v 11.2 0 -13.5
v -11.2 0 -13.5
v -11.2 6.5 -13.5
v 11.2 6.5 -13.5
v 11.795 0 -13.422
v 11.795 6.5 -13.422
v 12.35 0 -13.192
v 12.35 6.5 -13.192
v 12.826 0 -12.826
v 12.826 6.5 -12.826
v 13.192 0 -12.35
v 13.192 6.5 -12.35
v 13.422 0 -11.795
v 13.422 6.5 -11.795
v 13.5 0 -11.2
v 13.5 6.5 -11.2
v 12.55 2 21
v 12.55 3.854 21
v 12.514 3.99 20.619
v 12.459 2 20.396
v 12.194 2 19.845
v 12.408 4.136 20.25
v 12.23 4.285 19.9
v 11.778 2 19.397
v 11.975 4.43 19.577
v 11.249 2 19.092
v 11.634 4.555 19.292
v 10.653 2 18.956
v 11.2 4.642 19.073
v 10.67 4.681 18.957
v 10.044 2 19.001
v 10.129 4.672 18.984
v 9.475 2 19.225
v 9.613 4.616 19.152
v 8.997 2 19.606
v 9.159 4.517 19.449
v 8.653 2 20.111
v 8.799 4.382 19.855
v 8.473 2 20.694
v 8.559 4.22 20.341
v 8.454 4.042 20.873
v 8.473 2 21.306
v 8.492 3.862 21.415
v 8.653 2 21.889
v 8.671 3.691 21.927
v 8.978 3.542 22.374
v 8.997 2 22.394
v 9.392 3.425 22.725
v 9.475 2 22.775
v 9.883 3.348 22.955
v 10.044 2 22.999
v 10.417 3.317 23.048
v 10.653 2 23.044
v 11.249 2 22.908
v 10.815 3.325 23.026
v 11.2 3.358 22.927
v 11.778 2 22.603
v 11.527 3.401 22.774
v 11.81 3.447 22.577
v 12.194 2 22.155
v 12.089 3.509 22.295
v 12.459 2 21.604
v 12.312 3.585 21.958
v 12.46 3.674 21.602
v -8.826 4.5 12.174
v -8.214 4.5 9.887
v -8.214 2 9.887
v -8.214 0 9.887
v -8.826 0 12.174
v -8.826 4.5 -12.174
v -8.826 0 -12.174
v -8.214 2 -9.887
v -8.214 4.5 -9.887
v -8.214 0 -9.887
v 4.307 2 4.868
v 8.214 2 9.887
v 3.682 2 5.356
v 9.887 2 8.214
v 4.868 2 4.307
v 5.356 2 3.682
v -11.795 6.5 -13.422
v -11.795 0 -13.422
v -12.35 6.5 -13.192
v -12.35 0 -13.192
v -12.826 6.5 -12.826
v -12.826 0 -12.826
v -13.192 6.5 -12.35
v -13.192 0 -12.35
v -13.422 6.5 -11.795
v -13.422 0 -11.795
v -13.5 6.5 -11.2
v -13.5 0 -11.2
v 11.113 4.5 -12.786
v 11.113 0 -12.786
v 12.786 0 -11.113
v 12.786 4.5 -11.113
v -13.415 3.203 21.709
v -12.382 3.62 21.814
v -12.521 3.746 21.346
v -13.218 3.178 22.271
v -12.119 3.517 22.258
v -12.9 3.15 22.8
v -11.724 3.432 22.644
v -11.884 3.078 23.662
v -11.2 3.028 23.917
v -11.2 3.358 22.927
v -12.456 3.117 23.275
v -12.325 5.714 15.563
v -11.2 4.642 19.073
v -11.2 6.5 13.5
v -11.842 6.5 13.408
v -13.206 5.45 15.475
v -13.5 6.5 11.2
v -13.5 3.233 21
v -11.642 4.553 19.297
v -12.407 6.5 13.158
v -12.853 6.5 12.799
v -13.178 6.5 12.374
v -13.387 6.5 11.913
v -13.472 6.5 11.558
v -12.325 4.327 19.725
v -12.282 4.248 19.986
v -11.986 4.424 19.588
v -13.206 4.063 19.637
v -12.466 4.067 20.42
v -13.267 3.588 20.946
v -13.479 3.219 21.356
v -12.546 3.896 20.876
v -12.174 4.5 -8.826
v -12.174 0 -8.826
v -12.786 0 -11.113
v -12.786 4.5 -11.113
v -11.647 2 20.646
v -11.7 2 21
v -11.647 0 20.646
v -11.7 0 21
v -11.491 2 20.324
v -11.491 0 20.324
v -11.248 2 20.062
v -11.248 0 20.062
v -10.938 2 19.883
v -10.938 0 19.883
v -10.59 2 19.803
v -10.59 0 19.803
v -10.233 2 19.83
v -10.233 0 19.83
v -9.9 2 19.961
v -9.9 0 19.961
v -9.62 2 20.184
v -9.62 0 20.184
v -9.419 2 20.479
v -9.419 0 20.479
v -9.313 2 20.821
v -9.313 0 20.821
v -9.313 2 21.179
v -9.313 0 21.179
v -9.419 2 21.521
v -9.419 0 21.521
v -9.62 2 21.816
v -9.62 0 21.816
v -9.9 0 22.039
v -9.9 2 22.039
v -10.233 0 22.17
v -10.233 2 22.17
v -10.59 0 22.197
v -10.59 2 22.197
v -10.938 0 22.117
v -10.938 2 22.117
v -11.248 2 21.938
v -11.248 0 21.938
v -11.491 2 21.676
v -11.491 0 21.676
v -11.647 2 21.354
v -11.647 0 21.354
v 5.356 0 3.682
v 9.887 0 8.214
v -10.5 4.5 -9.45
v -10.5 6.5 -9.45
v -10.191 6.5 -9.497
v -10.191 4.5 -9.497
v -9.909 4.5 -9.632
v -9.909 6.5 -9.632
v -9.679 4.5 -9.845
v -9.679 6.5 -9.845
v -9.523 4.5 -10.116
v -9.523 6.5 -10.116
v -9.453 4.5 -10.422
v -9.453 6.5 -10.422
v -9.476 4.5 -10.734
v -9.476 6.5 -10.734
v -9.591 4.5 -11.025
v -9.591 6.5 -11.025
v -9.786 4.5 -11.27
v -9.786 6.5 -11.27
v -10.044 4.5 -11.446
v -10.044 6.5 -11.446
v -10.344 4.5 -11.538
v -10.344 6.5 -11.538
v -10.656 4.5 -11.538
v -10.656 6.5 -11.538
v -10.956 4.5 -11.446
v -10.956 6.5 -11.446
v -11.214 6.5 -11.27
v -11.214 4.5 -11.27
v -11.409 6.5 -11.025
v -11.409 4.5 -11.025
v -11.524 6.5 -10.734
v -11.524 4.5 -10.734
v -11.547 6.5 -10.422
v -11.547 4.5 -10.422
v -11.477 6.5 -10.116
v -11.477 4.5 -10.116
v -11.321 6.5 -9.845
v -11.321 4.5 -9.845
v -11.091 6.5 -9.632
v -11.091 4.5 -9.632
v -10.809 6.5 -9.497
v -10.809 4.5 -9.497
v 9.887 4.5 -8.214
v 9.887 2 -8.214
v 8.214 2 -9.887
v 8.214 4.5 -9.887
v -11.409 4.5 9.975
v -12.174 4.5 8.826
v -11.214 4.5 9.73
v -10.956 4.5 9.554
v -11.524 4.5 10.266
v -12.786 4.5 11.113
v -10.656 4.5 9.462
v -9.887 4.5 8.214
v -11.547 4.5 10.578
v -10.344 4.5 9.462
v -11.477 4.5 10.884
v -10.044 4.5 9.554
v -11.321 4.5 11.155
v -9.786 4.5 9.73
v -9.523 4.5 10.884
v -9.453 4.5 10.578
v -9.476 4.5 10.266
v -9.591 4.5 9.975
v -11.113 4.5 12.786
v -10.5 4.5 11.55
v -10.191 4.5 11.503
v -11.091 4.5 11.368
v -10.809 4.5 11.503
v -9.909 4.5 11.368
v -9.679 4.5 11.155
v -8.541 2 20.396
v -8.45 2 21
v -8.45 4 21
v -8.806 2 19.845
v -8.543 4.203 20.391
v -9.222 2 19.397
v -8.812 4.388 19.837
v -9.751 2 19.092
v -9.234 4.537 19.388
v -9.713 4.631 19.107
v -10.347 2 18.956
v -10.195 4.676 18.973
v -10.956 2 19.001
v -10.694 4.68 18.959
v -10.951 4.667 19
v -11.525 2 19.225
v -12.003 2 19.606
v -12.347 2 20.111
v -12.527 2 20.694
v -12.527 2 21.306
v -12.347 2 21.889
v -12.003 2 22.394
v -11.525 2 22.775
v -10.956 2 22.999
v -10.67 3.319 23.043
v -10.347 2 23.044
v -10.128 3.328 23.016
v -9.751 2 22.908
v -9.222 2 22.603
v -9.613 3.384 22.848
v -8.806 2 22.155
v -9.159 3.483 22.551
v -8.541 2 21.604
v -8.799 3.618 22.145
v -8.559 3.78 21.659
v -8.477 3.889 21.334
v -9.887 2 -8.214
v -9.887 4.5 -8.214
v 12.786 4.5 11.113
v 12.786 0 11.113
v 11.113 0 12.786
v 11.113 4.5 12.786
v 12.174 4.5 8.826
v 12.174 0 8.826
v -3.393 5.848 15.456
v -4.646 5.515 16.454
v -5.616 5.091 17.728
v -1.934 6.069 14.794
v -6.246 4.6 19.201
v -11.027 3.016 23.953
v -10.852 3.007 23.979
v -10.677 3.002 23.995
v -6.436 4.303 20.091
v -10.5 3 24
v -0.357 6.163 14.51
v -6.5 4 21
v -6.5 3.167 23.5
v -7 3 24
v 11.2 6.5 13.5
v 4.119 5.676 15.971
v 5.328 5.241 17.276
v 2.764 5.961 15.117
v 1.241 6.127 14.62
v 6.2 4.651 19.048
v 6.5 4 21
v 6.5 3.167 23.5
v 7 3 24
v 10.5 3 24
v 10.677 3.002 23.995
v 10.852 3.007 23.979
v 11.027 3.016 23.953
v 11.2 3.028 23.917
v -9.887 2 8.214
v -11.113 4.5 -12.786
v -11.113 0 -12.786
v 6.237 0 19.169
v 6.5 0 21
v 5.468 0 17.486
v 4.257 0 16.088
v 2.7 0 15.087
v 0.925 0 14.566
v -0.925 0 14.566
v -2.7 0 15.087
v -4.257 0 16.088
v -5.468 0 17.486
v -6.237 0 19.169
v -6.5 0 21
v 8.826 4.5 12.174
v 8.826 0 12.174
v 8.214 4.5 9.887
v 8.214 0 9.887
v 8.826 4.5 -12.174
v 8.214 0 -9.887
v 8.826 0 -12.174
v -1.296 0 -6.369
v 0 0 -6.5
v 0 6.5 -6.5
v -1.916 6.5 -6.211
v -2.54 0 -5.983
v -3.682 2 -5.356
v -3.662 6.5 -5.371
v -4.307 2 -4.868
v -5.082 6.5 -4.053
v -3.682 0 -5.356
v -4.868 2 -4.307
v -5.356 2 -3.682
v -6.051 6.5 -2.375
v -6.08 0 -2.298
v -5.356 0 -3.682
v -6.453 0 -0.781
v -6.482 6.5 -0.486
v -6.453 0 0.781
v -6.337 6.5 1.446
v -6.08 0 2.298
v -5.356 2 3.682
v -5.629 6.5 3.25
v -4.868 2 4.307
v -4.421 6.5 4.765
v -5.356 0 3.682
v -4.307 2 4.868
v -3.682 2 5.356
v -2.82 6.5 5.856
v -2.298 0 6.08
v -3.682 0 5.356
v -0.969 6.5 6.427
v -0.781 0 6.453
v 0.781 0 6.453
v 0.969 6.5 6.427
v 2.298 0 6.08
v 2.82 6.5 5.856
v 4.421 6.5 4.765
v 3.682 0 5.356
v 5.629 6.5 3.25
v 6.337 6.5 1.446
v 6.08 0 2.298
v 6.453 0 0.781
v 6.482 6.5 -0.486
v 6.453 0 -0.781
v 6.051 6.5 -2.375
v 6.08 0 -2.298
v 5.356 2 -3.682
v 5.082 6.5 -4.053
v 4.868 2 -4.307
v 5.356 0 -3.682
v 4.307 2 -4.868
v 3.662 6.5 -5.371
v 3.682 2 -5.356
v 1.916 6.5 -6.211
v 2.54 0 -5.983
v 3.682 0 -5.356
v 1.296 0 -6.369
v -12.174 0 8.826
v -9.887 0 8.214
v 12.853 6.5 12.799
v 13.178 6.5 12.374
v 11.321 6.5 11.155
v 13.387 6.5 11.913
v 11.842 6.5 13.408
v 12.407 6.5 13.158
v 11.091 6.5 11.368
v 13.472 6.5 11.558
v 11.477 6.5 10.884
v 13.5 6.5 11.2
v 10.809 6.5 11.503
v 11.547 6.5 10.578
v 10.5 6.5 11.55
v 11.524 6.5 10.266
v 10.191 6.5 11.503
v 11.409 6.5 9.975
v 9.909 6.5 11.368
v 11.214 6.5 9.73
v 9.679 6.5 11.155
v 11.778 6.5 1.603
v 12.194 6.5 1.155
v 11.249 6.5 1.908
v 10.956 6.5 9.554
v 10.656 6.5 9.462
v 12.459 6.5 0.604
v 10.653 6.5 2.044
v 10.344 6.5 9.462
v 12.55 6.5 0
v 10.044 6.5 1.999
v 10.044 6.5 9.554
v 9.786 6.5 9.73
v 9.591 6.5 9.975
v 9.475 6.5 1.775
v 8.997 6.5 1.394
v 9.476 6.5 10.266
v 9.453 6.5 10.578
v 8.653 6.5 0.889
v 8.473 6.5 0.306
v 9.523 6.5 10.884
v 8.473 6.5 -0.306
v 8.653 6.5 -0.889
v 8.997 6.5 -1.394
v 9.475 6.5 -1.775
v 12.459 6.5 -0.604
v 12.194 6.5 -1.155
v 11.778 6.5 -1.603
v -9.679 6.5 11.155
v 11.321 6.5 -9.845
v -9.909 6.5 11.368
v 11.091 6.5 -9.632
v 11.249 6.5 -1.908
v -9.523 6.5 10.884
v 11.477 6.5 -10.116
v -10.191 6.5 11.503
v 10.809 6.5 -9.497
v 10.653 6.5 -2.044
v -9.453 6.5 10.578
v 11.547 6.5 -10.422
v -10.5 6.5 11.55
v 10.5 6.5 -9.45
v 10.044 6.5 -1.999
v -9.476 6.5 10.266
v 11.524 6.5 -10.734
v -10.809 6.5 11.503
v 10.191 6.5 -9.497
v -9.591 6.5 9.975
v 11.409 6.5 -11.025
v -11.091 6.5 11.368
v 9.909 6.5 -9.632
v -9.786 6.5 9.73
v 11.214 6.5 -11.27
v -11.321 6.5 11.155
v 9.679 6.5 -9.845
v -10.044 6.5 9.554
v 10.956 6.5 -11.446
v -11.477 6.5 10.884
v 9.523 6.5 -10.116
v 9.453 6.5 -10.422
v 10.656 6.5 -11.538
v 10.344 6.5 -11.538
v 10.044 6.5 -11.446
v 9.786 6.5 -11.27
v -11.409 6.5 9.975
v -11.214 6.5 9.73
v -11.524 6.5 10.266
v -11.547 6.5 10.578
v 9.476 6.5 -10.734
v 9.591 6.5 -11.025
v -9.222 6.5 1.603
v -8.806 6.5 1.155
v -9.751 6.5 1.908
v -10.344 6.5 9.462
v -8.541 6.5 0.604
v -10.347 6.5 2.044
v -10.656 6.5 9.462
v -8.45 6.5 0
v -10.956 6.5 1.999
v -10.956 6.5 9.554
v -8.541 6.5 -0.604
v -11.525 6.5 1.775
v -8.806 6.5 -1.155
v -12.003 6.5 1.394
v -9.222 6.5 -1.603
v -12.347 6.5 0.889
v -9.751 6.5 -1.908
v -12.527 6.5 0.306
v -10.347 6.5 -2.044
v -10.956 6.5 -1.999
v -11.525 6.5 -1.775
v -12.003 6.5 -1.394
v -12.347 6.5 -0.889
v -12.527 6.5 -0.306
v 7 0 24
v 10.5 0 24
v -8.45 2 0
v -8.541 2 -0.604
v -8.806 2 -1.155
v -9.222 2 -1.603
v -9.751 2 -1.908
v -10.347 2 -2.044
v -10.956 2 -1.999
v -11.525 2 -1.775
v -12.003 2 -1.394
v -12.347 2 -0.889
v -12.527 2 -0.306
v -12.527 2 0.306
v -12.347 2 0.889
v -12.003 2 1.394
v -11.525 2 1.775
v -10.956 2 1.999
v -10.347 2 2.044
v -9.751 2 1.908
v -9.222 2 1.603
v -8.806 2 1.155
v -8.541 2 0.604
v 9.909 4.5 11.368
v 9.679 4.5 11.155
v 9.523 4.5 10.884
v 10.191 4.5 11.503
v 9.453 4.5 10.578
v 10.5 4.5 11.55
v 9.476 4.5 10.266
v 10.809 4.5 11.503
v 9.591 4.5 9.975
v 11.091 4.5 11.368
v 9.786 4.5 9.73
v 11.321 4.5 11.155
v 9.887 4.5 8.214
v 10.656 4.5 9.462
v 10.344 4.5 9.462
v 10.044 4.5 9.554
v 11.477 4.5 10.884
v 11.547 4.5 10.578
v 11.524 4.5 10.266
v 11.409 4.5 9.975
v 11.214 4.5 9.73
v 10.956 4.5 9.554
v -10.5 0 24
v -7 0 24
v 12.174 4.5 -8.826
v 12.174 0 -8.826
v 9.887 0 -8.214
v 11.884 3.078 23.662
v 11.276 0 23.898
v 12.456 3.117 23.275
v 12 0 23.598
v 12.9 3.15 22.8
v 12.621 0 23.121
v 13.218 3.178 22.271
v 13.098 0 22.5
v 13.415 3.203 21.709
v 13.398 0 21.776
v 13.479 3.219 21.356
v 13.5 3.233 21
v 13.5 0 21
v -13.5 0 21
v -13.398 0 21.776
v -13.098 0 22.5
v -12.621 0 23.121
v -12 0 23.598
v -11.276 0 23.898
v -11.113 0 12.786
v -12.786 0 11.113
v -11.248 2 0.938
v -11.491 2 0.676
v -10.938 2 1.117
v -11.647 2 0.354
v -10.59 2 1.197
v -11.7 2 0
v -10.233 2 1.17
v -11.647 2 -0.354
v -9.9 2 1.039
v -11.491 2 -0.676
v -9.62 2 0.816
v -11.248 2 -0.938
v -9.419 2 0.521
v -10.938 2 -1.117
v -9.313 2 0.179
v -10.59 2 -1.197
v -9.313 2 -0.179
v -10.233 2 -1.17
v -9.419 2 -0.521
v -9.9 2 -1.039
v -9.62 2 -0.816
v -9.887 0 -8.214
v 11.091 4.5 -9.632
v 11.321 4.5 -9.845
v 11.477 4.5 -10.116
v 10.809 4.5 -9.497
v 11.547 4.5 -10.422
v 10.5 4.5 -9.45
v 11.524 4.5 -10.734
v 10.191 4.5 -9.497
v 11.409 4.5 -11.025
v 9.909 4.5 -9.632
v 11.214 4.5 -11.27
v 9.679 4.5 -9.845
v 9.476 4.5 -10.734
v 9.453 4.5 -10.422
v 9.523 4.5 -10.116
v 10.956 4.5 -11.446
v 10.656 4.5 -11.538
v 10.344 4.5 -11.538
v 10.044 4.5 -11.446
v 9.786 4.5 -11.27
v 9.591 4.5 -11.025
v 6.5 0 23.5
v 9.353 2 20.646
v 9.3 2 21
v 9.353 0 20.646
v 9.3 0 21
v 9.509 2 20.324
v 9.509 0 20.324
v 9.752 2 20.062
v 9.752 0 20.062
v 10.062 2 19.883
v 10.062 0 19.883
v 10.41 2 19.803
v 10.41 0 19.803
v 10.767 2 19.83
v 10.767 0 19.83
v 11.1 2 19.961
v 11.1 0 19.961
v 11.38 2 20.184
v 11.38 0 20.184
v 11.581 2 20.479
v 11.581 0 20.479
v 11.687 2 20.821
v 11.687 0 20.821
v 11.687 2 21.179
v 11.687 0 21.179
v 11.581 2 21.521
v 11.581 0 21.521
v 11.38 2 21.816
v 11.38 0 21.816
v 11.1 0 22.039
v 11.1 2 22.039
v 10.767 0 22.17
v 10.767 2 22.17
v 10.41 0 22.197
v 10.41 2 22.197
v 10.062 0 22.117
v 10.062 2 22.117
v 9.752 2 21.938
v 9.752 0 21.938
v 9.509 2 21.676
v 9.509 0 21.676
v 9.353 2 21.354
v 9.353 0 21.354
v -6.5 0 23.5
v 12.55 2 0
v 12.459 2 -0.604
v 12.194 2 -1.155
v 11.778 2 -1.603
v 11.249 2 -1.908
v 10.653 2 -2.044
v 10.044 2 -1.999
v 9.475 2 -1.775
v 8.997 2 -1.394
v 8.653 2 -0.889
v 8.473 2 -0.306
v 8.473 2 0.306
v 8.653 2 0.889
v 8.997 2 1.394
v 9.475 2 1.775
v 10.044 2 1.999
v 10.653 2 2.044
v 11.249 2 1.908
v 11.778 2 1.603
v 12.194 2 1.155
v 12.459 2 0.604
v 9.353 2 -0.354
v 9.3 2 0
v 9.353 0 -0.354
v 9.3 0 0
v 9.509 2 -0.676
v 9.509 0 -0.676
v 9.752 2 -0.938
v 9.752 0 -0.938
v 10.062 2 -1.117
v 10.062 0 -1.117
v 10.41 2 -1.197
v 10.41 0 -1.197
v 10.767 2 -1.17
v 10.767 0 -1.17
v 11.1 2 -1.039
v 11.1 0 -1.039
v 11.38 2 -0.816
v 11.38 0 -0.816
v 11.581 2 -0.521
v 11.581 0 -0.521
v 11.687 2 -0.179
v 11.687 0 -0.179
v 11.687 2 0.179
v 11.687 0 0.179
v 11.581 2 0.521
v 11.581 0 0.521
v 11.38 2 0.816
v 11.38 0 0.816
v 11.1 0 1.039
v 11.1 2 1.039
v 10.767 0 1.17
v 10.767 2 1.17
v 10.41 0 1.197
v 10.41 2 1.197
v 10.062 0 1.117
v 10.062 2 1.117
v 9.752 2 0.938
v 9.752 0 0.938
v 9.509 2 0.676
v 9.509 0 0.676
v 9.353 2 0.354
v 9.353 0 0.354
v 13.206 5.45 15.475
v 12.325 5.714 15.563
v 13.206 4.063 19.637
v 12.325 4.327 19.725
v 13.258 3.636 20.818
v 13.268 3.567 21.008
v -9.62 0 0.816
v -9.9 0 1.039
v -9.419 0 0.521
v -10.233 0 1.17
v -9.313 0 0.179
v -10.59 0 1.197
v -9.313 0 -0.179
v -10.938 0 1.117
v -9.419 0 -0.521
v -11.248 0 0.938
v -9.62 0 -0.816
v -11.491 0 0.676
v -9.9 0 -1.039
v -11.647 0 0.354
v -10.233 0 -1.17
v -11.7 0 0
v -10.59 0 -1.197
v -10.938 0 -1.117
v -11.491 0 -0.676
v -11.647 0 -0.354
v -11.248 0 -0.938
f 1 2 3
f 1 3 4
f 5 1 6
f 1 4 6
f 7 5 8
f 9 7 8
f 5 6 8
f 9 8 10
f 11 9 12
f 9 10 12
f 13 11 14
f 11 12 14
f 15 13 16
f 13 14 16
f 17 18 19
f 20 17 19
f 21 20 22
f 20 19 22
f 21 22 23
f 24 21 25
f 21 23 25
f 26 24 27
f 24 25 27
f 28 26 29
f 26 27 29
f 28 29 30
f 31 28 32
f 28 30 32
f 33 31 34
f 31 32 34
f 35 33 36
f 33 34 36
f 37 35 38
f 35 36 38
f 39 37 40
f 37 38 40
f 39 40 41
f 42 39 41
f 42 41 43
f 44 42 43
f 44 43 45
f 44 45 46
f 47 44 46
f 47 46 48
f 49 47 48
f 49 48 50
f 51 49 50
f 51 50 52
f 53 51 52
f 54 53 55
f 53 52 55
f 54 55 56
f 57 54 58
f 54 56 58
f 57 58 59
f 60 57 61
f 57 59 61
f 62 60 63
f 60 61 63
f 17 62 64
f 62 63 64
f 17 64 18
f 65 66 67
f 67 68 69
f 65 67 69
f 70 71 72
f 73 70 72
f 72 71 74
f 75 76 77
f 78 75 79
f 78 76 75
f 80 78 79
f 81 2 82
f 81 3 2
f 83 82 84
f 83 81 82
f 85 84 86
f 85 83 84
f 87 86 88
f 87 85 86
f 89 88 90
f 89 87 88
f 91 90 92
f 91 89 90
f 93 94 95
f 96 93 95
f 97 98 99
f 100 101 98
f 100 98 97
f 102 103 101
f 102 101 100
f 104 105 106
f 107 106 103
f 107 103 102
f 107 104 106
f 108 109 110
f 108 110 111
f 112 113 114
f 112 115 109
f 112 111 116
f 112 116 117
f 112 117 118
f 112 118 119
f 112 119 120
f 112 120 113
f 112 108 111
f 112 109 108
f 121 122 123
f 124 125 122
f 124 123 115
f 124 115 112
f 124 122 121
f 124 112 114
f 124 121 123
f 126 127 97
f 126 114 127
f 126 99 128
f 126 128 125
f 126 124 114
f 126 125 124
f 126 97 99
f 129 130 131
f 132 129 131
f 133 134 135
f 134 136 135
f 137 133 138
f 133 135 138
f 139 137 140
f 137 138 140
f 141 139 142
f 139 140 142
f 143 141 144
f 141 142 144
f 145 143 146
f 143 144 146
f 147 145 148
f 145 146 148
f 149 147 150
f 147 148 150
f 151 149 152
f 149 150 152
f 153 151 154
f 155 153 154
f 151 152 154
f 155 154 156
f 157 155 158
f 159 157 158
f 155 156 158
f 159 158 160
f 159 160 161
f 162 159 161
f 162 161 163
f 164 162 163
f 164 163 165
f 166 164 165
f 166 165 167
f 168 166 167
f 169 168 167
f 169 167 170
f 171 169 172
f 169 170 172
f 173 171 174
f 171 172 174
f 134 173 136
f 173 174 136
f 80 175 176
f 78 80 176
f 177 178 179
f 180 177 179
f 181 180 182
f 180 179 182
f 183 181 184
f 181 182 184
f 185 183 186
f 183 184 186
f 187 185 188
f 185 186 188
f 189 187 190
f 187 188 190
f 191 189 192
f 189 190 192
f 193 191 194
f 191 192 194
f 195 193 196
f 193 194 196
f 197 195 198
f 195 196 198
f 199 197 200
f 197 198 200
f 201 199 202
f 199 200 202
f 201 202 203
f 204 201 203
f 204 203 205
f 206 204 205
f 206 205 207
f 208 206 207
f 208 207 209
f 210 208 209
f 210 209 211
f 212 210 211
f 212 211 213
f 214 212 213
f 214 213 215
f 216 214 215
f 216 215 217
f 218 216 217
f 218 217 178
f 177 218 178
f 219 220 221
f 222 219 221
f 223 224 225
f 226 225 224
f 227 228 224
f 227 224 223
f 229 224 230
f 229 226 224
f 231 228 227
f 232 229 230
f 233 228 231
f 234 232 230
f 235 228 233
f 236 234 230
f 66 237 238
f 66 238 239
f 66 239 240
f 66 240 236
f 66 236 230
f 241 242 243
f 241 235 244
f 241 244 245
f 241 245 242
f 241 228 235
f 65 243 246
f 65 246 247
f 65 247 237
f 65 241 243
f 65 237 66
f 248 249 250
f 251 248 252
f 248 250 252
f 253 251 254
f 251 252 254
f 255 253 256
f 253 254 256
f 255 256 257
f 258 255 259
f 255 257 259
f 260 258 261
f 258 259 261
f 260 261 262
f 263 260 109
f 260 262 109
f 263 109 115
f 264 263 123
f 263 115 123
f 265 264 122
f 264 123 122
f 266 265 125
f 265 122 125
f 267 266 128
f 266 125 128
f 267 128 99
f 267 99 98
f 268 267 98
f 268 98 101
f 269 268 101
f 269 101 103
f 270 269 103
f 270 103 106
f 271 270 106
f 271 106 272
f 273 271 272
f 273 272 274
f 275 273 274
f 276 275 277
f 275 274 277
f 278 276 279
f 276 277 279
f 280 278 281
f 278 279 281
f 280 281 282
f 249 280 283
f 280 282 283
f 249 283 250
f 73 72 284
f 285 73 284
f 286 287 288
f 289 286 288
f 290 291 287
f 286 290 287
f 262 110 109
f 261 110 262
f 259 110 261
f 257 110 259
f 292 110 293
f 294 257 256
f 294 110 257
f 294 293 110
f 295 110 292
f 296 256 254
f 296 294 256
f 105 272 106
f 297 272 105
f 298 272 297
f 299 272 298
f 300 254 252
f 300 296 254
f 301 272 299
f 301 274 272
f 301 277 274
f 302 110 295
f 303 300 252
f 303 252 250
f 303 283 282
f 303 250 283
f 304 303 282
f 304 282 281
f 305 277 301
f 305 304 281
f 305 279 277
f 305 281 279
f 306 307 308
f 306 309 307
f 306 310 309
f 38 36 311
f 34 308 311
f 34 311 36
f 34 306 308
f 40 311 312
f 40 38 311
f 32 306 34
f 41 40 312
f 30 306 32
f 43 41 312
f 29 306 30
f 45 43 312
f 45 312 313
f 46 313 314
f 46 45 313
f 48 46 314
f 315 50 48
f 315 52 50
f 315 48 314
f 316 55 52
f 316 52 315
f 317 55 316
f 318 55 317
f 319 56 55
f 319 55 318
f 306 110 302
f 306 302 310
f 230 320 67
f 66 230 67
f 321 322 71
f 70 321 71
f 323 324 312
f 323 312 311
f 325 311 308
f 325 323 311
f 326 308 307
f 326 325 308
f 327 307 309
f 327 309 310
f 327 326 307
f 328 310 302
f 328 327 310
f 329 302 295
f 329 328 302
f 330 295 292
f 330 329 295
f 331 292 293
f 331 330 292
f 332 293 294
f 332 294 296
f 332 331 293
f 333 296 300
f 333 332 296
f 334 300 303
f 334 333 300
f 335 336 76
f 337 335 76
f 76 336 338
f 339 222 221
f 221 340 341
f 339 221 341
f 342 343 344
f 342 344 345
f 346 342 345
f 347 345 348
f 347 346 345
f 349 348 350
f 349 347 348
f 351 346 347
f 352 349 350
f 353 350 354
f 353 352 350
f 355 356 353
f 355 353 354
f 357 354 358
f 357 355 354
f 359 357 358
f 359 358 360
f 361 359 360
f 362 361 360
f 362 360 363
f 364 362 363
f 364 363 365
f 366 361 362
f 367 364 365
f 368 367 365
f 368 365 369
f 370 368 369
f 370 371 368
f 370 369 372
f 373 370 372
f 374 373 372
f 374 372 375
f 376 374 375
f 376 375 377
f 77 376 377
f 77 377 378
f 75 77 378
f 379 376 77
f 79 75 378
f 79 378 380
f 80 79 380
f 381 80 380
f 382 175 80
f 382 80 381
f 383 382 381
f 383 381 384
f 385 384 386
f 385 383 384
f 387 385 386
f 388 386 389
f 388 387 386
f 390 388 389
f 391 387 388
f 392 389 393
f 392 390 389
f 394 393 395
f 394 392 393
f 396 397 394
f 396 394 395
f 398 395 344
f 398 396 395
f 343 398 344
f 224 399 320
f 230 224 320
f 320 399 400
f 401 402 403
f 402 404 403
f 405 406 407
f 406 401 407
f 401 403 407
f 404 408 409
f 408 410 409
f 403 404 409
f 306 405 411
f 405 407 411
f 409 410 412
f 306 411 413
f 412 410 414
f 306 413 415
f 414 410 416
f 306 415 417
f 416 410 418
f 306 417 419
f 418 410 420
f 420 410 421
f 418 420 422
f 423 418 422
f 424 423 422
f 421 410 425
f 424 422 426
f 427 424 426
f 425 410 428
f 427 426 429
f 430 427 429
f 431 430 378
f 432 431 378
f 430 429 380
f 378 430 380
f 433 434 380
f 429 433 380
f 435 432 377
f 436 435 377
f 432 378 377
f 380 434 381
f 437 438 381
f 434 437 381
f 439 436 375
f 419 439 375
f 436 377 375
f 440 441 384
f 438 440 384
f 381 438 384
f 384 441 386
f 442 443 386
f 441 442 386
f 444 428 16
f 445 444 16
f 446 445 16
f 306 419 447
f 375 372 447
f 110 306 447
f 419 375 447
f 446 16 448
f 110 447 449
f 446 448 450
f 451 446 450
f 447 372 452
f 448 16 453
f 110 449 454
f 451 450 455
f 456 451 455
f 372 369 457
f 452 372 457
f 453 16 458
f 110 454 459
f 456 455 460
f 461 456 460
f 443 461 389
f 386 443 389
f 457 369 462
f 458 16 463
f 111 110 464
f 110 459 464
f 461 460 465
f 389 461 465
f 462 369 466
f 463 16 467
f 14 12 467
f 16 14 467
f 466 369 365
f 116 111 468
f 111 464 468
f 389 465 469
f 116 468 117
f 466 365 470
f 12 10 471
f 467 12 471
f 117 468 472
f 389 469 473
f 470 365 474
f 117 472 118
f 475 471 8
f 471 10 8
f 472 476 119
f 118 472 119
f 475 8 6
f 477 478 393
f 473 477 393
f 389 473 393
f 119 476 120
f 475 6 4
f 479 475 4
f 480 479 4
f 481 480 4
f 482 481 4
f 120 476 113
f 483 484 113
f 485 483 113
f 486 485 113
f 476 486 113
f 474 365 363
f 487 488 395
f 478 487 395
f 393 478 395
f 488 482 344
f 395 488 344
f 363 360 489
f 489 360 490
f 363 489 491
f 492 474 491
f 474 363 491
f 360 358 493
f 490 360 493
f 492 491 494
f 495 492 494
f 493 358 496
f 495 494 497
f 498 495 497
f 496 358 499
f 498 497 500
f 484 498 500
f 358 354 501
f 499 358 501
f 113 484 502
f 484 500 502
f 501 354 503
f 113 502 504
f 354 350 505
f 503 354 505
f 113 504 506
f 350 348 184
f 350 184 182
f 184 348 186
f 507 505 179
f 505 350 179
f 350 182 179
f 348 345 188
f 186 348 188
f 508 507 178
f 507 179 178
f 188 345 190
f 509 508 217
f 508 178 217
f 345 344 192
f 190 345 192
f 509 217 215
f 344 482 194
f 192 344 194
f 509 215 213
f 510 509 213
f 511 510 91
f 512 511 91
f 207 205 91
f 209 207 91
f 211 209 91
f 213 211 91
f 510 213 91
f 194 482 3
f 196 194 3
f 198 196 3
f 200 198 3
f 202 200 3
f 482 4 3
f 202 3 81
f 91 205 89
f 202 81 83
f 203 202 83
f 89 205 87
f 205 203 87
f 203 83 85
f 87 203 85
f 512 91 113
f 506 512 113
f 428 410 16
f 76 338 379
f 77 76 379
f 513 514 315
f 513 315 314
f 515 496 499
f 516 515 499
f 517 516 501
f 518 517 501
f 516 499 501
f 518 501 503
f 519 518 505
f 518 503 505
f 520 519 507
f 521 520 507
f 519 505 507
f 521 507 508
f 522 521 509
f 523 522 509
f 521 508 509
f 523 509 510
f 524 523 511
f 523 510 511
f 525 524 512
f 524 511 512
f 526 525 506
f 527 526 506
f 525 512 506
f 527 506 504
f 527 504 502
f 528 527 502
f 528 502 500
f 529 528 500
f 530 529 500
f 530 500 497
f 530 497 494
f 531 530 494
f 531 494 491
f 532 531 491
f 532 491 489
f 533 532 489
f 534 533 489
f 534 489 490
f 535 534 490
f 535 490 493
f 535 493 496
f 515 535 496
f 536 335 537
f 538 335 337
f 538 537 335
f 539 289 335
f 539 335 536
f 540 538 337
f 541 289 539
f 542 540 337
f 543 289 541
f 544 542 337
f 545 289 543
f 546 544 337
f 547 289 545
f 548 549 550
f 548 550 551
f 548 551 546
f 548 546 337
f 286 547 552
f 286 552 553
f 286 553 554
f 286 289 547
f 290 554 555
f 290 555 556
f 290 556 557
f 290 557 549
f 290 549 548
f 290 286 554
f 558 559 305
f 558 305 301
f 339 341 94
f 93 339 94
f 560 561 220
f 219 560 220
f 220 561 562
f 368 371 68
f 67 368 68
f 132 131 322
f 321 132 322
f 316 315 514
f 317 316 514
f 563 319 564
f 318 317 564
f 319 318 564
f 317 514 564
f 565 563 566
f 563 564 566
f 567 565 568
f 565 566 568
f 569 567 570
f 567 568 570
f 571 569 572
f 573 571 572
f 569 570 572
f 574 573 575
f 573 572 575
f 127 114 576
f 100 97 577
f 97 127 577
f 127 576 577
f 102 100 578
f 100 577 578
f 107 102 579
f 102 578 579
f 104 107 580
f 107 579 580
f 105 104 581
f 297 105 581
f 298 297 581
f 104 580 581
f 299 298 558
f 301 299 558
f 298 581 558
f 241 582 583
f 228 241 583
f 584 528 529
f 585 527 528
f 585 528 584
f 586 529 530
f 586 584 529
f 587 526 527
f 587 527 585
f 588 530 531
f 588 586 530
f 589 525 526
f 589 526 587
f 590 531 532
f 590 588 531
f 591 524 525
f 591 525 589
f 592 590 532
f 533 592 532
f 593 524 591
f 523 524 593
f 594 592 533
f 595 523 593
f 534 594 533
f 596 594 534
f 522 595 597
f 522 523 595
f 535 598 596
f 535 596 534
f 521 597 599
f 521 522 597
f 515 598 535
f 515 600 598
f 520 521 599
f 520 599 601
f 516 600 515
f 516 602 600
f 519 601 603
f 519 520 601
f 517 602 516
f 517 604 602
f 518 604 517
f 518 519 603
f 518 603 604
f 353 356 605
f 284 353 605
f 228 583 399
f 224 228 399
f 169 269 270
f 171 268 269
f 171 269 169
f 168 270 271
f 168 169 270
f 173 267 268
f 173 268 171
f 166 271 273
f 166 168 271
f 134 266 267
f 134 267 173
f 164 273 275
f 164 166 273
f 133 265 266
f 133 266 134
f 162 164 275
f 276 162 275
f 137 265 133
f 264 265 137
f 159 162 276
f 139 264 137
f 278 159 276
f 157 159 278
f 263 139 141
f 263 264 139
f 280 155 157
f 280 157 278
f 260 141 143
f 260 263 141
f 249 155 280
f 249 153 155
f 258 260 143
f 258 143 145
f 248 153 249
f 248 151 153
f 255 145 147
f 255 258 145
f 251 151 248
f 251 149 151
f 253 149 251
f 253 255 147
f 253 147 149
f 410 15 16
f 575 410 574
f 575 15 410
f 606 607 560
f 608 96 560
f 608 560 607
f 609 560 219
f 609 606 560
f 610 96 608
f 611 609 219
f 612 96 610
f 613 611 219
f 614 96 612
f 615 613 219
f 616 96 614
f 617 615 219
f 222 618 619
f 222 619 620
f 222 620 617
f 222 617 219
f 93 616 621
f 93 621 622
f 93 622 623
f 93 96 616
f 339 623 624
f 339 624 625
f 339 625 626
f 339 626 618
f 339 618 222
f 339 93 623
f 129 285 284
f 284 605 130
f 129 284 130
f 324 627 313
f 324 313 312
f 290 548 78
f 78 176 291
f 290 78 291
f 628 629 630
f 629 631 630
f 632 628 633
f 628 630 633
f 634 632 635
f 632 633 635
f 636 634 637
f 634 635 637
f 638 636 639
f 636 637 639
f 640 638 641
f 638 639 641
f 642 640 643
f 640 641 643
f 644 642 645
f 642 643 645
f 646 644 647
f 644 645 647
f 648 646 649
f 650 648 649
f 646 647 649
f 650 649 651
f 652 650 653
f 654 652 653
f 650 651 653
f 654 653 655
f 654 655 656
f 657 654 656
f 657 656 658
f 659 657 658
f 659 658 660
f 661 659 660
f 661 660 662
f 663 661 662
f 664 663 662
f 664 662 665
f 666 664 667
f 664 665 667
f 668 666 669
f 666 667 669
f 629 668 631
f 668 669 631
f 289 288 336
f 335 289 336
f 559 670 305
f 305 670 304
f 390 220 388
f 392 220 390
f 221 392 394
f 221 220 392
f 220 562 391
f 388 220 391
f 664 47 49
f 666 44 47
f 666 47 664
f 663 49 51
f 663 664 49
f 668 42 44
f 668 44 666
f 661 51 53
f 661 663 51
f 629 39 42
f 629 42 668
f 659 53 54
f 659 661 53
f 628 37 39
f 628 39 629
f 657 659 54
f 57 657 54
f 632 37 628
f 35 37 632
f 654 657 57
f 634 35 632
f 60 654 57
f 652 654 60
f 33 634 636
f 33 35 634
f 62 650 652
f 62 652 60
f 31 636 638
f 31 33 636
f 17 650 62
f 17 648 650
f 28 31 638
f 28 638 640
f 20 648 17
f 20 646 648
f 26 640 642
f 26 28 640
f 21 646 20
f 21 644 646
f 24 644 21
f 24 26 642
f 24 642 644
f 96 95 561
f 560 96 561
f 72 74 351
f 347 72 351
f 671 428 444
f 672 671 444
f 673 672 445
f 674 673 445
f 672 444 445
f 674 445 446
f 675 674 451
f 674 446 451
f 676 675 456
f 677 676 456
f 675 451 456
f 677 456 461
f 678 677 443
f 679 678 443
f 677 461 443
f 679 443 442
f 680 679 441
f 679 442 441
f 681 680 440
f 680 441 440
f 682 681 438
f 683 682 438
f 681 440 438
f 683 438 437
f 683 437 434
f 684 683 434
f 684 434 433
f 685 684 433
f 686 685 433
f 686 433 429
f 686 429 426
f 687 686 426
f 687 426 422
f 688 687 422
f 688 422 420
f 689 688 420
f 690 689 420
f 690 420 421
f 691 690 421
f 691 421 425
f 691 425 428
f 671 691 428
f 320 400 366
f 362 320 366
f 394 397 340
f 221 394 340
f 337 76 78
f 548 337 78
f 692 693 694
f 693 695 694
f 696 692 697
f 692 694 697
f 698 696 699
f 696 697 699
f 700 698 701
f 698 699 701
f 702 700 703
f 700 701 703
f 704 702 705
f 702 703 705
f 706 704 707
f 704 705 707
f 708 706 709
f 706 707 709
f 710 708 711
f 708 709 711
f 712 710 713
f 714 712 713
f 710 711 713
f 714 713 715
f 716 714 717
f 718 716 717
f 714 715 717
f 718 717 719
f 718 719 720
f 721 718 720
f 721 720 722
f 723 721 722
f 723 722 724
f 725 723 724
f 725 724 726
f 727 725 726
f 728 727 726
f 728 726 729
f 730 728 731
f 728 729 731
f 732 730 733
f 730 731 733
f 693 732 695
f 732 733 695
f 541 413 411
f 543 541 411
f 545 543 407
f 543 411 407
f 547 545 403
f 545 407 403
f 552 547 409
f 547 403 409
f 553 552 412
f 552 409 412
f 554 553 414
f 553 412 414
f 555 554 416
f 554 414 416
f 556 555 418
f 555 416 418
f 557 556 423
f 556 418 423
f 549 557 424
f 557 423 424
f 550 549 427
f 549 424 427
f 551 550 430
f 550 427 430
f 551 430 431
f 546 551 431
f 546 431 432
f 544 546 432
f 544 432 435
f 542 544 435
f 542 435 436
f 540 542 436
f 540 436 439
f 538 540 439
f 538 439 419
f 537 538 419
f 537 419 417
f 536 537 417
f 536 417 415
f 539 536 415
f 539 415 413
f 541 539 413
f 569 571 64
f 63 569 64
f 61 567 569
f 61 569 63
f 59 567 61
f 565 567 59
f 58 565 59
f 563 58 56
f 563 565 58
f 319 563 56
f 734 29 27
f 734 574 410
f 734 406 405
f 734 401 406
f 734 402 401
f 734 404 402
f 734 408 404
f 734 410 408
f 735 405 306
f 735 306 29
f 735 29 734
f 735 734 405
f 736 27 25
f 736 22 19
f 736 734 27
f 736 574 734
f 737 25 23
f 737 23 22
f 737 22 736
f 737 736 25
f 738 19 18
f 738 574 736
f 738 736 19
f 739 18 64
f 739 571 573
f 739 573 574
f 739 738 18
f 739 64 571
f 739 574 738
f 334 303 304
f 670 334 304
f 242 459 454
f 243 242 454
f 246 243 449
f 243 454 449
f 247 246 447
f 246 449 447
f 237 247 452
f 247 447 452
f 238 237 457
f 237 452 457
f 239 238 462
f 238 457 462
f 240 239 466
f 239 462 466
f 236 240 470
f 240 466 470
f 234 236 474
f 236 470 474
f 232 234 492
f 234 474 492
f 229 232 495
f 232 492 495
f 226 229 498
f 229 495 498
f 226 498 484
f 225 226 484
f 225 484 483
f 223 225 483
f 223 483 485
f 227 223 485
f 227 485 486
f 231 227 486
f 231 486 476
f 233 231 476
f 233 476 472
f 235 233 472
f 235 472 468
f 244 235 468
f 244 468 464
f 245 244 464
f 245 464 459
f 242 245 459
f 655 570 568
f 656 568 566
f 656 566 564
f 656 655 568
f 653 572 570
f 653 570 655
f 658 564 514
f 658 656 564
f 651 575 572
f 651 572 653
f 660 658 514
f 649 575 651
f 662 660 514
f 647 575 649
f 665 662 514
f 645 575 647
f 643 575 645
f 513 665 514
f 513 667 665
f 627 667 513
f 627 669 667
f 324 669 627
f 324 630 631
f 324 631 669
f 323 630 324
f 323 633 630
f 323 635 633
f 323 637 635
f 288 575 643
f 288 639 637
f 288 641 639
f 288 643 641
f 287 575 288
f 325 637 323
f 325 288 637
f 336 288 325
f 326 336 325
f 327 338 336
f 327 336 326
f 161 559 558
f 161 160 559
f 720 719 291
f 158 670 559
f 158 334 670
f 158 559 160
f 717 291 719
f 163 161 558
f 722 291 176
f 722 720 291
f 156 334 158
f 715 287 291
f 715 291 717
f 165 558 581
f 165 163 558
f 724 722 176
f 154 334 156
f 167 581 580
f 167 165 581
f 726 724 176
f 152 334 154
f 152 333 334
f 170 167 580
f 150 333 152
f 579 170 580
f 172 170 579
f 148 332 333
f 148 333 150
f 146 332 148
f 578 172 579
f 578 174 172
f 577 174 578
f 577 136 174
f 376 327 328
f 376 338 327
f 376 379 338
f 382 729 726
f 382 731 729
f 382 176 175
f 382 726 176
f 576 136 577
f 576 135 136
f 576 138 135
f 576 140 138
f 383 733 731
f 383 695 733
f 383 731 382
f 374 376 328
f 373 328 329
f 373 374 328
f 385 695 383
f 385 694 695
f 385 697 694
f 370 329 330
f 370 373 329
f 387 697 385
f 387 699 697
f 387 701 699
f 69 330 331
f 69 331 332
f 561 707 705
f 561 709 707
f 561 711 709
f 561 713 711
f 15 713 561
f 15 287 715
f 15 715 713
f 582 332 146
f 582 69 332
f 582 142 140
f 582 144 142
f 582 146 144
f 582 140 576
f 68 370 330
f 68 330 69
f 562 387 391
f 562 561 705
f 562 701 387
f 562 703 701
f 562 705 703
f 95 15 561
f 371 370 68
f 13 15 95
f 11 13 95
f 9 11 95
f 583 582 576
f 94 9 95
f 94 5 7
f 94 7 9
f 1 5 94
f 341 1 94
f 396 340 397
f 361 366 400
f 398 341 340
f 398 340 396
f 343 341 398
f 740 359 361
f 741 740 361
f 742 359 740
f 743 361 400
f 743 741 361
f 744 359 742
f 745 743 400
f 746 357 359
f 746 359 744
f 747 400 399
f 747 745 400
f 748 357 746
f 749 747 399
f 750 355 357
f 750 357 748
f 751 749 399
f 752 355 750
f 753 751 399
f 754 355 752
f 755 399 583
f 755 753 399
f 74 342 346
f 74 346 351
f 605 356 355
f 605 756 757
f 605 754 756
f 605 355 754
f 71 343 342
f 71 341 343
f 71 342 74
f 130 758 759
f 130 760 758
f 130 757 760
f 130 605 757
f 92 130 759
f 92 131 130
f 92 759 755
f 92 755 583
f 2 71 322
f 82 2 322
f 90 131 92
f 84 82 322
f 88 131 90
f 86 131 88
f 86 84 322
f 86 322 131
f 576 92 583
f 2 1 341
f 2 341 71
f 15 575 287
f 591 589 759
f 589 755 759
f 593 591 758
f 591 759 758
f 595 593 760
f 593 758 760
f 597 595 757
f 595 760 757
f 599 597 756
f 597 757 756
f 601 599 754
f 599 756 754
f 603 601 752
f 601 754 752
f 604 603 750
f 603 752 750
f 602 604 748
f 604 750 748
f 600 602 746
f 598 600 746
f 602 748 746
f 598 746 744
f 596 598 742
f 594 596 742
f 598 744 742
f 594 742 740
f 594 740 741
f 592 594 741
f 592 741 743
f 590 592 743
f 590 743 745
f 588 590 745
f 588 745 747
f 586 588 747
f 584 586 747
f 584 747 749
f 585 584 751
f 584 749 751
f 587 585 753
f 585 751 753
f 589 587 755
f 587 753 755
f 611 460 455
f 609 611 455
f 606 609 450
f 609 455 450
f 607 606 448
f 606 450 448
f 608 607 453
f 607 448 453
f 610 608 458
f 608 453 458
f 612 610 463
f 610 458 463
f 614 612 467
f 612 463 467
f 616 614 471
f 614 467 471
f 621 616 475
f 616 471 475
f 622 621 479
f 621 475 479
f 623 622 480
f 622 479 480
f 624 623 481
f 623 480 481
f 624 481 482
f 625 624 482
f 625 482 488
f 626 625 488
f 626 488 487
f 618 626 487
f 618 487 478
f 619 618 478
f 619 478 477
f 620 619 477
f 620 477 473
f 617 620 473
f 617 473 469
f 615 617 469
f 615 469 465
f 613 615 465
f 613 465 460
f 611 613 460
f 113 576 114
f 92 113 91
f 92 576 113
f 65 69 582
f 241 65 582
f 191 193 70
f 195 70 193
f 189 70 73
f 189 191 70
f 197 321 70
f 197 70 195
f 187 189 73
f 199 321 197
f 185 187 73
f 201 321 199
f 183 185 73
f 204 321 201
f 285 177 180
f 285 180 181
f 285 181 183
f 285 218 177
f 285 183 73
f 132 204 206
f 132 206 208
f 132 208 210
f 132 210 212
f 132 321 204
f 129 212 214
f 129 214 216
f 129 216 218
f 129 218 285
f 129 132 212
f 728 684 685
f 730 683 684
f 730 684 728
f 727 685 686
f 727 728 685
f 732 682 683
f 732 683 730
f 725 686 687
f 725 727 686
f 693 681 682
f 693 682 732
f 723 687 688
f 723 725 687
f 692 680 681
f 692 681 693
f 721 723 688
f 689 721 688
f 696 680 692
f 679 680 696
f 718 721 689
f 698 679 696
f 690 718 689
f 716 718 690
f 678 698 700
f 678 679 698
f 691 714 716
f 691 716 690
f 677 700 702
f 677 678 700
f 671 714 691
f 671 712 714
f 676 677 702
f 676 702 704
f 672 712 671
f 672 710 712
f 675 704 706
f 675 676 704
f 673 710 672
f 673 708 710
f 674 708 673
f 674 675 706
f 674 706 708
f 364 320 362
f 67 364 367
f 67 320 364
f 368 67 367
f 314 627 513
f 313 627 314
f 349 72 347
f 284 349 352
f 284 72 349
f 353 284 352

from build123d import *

# Parameters (mm, degrees)
SKETCH_1_R                   = 6.5
EXTRUDE_1_DEPTH              = 6.5
CUT_EXTRUDE_1_DEPTH          = 37.704904304
FILLET_2_R                   = 2.3
SWEEP_START                  = -22.062157242
SWEEP_2_DEPTH                = 13.492384883
CHAMFER_1_SIZE               = 0.5
FILLET_3_R                   = 3
HOLE_WIZARD_M2_1_D           = 2.4
HOLE_WIZARD_M2_1_DEPTH       = 8.5
HOLE_WIZARD_M2_1_CBORE_D     = 4.1
HOLE_WIZARD_M2_1_CBORE_DEPTH = 4.5
HOLE_WIZARD_M2_1_TIP         = 0.721032743
SKETCH_7_R                   = 1.05
CUT_EXTRUDE_2_DEPTH          = 6.5
CUT_EXTRUDE_3_DEPTH          = 4.5
CUT_EXTRUDE_4_DEPTH          = 2
PATTERN_CIRCULAR_1_COUNT     = 4


# Read off the part's stored shape, not the designer's step: ｶｯﾄ - ｽｲｰﾌﾟ2
with BuildPart() as part:
    # ｽｹｯﾁ1 → ﾎﾞｽ - 押し出し1 (new body)
    with BuildSketch(Plane(origin=(0, 0, 0), x_dir=(1, 0, 0), z_dir=(0, 1, 0))):
        with BuildLine():
            Line((-13.5, 13.5), (13.5, 13.5))
            Line((13.5, 13.5), (13.5, -24))
            Line((13.5, -24), (6.5, -24))
            Line((6.5, -24), (6.5, -21))
            ThreePointArc((6.5, -21), (0, -14.5), (-6.5, -21))
            Line((-6.5, -21), (-6.5, -24))
            Line((-6.5, -24), (-13.5, -24))
            Line((-13.5, -24), (-13.5, 13.5))
        make_face()
        with Locations(Location((0, 0, 0), (0, 0, 90))):
            Circle(SKETCH_1_R, mode=Mode.SUBTRACT)
    extrude(amount=EXTRUDE_1_DEPTH)

    # ｽｹｯﾁ2 → ｶｯﾄ - 押し出し1 (cut, through all)
    with BuildSketch(Plane(origin=(13.5, 0, 0), x_dir=(0, 0, -1), z_dir=(1, 0, 0))):
        Polygon((-24, 3), (-24, 6.5), (-13.5, 6.5), align=None)
    extrude(amount=-CUT_EXTRUDE_1_DEPTH, mode=Mode.SUBTRACT)

    # ﾌｨﾚｯﾄ2
    fillet_2_edges = [part.edges().sort_by_distance(p)[0] for p in [
        (-13.5, 3.25, -13.5),
        (13.5, 3.25, -13.5),
    ]]
    fillet(fillet_2_edges, radius=FILLET_2_R)

    # ｶｯﾄ - ｽｲｰﾌﾟ2 outline → ｶｯﾄ - ｽｲｰﾌﾟ2 (cut)
    with BuildSketch(Plane(origin=(0, 0, 0), x_dir=(1, 0, 0), z_dir=(0, 0.3162277660168393, -0.9486832980505134)).offset(SWEEP_START)):
        with BuildLine():
            Line((-13.5, -10.435516279), (-11.2, -10.435516279))
            add(Edge.make_bspline(
                [(-11.2, -10.435516279), (-12.547308807, -10.435516279), (-13.5, -10.134248871), (-13.5, -9.708192417)],
                knots=[0, 0, 0, 0, 1, 1, 1, 1], degree=3, weights=[1, 0.804737854, 0.804737854, 1]))
            Line((-13.5, -9.708192417), (-13.5, -10.435516279))
        make_face()
        with BuildLine():
            add(Edge.make_bspline(
                [(13.5, -9.708192417), (13.5, -10.134248871), (12.547308807, -10.435516279), (11.2, -10.435516279)],
                knots=[0, 0, 0, 0, 1, 1, 1, 1], degree=3, weights=[1, 0.804737854, 0.804737854, 1]))
            Line((11.2, -10.435516279), (13.5, -10.435516279))
            Line((13.5, -10.435516279), (13.5, -9.708192417))
        make_face()
    extrude(amount=SWEEP_2_DEPTH, mode=Mode.SUBTRACT)

    # 面取り1
    chamfer_1_edges = [part.edges().sort_by_distance(p)[0] for p in [
        (6.5, 1.5, 24),
        (-6.5, 1.5, 24),
    ]]
    chamfer(chamfer_1_edges, length=CHAMFER_1_SIZE)

    # ﾌｨﾚｯﾄ3
    # the kernel refuses this fillet: 3 mm, written as the material it takes off along each edge
    with BuildSketch(Plane(origin=(13.5, -7.5, 24), x_dir=(0, 0, -1), z_dir=(0, 1, 0)), Plane(origin=(-13.5, -7.5, 24), x_dir=(1, 0, 0), z_dir=(0, 1, 0))) as fillet_3_piece_1:
        with BuildLine():
            CenterArc((FILLET_3_R, FILLET_3_R), FILLET_3_R, 180, 90)
            Line((0, FILLET_3_R), (0, 0))
            Line((0, 0), (FILLET_3_R, 0))
        make_face()
    extrude(amount=17.233333302, mode=Mode.SUBTRACT)

    # M2 なべ頭ねじ用座ぐり穴1
    with Locations(Plane(origin=(0, 6.5, 0), x_dir=(1, 0, 0), z_dir=(0, 1, 0))):
        with Locations((-10.5, 0), (10.5, 0), (10.5, -21), (-10.5, -21)):
            CounterBoreHole(HOLE_WIZARD_M2_1_D / 2, HOLE_WIZARD_M2_1_CBORE_D / 2, HOLE_WIZARD_M2_1_CBORE_DEPTH, depth=HOLE_WIZARD_M2_1_DEPTH)
            with Locations((0, 0, -(HOLE_WIZARD_M2_1_DEPTH + HOLE_WIZARD_M2_1_TIP / 2))):  # 118° drill point
                Cone(0, HOLE_WIZARD_M2_1_D / 2, HOLE_WIZARD_M2_1_TIP, mode=Mode.SUBTRACT)

    # ｽｹｯﾁ7 → ｶｯﾄ - 押し出し2 (cut)
    with BuildSketch(Plane(origin=(0, 6.5, 0), x_dir=(1, 0, 0), z_dir=(0, 1, 0))):
        with Locations(Location((-10.5, 10.5, 0), (0, 0, 270))):
            Circle(SKETCH_7_R)
        with Locations(Location((10.5, 10.5, 0), (0, 0, 270))):
            Circle(SKETCH_7_R)
        with Locations(Location((-10.5, -10.5, 0), (0, 0, 270))):
            Circle(SKETCH_7_R)
        with Locations(Location((10.5, -10.5, 0), (0, 0, 270))):
            Circle(SKETCH_7_R)
    extrude(amount=-CUT_EXTRUDE_2_DEPTH, mode=Mode.SUBTRACT)

    # ｽｹｯﾁ8 → ｶｯﾄ - 押し出し3 (cut)
    with BuildSketch(Plane.XZ):
        Polygon((-8.213522103, 9.887340094), (-8.826182009, 12.173817991), (-11.112659906, 12.786477897), (-12.786477897, 11.112659906), (-12.173817991, 8.826182009), (-9.887340094, 8.213522103), align=None)
    cut_extrude_3 = extrude(amount=-CUT_EXTRUDE_3_DEPTH, mode=Mode.SUBTRACT)

    # ｽｹｯﾁ9 → ｶｯﾄ - 押し出し4 (cut)
    with BuildSketch(Plane.XZ):
        Polygon((-9.887340094, 8.213522103), (-4.230485845, 2.556667854), (-2.556667854, 4.230485845), (-8.213522103, 9.887340094), align=None)
    cut_extrude_4 = extrude(amount=-CUT_EXTRUDE_4_DEPTH, mode=Mode.SUBTRACT)

    # 円形ﾊﾟﾀｰﾝ1: ｶｯﾄ - 押し出し3, ｶｯﾄ - 押し出し4 ×4 about axis
    pattern_circular_1_axis = Axis((0, 0, 0), (0, 1, 0))
    add([cut_extrude_3.rotate(pattern_circular_1_axis, i * 360 / PATTERN_CIRCULAR_1_COUNT) for i in range(1, PATTERN_CIRCULAR_1_COUNT)], mode=Mode.SUBTRACT)
    add([cut_extrude_4.rotate(pattern_circular_1_axis, i * 360 / PATTERN_CIRCULAR_1_COUNT) for i in range(1, PATTERN_CIRCULAR_1_COUNT)], mode=Mode.SUBTRACT)


solid = part.part
